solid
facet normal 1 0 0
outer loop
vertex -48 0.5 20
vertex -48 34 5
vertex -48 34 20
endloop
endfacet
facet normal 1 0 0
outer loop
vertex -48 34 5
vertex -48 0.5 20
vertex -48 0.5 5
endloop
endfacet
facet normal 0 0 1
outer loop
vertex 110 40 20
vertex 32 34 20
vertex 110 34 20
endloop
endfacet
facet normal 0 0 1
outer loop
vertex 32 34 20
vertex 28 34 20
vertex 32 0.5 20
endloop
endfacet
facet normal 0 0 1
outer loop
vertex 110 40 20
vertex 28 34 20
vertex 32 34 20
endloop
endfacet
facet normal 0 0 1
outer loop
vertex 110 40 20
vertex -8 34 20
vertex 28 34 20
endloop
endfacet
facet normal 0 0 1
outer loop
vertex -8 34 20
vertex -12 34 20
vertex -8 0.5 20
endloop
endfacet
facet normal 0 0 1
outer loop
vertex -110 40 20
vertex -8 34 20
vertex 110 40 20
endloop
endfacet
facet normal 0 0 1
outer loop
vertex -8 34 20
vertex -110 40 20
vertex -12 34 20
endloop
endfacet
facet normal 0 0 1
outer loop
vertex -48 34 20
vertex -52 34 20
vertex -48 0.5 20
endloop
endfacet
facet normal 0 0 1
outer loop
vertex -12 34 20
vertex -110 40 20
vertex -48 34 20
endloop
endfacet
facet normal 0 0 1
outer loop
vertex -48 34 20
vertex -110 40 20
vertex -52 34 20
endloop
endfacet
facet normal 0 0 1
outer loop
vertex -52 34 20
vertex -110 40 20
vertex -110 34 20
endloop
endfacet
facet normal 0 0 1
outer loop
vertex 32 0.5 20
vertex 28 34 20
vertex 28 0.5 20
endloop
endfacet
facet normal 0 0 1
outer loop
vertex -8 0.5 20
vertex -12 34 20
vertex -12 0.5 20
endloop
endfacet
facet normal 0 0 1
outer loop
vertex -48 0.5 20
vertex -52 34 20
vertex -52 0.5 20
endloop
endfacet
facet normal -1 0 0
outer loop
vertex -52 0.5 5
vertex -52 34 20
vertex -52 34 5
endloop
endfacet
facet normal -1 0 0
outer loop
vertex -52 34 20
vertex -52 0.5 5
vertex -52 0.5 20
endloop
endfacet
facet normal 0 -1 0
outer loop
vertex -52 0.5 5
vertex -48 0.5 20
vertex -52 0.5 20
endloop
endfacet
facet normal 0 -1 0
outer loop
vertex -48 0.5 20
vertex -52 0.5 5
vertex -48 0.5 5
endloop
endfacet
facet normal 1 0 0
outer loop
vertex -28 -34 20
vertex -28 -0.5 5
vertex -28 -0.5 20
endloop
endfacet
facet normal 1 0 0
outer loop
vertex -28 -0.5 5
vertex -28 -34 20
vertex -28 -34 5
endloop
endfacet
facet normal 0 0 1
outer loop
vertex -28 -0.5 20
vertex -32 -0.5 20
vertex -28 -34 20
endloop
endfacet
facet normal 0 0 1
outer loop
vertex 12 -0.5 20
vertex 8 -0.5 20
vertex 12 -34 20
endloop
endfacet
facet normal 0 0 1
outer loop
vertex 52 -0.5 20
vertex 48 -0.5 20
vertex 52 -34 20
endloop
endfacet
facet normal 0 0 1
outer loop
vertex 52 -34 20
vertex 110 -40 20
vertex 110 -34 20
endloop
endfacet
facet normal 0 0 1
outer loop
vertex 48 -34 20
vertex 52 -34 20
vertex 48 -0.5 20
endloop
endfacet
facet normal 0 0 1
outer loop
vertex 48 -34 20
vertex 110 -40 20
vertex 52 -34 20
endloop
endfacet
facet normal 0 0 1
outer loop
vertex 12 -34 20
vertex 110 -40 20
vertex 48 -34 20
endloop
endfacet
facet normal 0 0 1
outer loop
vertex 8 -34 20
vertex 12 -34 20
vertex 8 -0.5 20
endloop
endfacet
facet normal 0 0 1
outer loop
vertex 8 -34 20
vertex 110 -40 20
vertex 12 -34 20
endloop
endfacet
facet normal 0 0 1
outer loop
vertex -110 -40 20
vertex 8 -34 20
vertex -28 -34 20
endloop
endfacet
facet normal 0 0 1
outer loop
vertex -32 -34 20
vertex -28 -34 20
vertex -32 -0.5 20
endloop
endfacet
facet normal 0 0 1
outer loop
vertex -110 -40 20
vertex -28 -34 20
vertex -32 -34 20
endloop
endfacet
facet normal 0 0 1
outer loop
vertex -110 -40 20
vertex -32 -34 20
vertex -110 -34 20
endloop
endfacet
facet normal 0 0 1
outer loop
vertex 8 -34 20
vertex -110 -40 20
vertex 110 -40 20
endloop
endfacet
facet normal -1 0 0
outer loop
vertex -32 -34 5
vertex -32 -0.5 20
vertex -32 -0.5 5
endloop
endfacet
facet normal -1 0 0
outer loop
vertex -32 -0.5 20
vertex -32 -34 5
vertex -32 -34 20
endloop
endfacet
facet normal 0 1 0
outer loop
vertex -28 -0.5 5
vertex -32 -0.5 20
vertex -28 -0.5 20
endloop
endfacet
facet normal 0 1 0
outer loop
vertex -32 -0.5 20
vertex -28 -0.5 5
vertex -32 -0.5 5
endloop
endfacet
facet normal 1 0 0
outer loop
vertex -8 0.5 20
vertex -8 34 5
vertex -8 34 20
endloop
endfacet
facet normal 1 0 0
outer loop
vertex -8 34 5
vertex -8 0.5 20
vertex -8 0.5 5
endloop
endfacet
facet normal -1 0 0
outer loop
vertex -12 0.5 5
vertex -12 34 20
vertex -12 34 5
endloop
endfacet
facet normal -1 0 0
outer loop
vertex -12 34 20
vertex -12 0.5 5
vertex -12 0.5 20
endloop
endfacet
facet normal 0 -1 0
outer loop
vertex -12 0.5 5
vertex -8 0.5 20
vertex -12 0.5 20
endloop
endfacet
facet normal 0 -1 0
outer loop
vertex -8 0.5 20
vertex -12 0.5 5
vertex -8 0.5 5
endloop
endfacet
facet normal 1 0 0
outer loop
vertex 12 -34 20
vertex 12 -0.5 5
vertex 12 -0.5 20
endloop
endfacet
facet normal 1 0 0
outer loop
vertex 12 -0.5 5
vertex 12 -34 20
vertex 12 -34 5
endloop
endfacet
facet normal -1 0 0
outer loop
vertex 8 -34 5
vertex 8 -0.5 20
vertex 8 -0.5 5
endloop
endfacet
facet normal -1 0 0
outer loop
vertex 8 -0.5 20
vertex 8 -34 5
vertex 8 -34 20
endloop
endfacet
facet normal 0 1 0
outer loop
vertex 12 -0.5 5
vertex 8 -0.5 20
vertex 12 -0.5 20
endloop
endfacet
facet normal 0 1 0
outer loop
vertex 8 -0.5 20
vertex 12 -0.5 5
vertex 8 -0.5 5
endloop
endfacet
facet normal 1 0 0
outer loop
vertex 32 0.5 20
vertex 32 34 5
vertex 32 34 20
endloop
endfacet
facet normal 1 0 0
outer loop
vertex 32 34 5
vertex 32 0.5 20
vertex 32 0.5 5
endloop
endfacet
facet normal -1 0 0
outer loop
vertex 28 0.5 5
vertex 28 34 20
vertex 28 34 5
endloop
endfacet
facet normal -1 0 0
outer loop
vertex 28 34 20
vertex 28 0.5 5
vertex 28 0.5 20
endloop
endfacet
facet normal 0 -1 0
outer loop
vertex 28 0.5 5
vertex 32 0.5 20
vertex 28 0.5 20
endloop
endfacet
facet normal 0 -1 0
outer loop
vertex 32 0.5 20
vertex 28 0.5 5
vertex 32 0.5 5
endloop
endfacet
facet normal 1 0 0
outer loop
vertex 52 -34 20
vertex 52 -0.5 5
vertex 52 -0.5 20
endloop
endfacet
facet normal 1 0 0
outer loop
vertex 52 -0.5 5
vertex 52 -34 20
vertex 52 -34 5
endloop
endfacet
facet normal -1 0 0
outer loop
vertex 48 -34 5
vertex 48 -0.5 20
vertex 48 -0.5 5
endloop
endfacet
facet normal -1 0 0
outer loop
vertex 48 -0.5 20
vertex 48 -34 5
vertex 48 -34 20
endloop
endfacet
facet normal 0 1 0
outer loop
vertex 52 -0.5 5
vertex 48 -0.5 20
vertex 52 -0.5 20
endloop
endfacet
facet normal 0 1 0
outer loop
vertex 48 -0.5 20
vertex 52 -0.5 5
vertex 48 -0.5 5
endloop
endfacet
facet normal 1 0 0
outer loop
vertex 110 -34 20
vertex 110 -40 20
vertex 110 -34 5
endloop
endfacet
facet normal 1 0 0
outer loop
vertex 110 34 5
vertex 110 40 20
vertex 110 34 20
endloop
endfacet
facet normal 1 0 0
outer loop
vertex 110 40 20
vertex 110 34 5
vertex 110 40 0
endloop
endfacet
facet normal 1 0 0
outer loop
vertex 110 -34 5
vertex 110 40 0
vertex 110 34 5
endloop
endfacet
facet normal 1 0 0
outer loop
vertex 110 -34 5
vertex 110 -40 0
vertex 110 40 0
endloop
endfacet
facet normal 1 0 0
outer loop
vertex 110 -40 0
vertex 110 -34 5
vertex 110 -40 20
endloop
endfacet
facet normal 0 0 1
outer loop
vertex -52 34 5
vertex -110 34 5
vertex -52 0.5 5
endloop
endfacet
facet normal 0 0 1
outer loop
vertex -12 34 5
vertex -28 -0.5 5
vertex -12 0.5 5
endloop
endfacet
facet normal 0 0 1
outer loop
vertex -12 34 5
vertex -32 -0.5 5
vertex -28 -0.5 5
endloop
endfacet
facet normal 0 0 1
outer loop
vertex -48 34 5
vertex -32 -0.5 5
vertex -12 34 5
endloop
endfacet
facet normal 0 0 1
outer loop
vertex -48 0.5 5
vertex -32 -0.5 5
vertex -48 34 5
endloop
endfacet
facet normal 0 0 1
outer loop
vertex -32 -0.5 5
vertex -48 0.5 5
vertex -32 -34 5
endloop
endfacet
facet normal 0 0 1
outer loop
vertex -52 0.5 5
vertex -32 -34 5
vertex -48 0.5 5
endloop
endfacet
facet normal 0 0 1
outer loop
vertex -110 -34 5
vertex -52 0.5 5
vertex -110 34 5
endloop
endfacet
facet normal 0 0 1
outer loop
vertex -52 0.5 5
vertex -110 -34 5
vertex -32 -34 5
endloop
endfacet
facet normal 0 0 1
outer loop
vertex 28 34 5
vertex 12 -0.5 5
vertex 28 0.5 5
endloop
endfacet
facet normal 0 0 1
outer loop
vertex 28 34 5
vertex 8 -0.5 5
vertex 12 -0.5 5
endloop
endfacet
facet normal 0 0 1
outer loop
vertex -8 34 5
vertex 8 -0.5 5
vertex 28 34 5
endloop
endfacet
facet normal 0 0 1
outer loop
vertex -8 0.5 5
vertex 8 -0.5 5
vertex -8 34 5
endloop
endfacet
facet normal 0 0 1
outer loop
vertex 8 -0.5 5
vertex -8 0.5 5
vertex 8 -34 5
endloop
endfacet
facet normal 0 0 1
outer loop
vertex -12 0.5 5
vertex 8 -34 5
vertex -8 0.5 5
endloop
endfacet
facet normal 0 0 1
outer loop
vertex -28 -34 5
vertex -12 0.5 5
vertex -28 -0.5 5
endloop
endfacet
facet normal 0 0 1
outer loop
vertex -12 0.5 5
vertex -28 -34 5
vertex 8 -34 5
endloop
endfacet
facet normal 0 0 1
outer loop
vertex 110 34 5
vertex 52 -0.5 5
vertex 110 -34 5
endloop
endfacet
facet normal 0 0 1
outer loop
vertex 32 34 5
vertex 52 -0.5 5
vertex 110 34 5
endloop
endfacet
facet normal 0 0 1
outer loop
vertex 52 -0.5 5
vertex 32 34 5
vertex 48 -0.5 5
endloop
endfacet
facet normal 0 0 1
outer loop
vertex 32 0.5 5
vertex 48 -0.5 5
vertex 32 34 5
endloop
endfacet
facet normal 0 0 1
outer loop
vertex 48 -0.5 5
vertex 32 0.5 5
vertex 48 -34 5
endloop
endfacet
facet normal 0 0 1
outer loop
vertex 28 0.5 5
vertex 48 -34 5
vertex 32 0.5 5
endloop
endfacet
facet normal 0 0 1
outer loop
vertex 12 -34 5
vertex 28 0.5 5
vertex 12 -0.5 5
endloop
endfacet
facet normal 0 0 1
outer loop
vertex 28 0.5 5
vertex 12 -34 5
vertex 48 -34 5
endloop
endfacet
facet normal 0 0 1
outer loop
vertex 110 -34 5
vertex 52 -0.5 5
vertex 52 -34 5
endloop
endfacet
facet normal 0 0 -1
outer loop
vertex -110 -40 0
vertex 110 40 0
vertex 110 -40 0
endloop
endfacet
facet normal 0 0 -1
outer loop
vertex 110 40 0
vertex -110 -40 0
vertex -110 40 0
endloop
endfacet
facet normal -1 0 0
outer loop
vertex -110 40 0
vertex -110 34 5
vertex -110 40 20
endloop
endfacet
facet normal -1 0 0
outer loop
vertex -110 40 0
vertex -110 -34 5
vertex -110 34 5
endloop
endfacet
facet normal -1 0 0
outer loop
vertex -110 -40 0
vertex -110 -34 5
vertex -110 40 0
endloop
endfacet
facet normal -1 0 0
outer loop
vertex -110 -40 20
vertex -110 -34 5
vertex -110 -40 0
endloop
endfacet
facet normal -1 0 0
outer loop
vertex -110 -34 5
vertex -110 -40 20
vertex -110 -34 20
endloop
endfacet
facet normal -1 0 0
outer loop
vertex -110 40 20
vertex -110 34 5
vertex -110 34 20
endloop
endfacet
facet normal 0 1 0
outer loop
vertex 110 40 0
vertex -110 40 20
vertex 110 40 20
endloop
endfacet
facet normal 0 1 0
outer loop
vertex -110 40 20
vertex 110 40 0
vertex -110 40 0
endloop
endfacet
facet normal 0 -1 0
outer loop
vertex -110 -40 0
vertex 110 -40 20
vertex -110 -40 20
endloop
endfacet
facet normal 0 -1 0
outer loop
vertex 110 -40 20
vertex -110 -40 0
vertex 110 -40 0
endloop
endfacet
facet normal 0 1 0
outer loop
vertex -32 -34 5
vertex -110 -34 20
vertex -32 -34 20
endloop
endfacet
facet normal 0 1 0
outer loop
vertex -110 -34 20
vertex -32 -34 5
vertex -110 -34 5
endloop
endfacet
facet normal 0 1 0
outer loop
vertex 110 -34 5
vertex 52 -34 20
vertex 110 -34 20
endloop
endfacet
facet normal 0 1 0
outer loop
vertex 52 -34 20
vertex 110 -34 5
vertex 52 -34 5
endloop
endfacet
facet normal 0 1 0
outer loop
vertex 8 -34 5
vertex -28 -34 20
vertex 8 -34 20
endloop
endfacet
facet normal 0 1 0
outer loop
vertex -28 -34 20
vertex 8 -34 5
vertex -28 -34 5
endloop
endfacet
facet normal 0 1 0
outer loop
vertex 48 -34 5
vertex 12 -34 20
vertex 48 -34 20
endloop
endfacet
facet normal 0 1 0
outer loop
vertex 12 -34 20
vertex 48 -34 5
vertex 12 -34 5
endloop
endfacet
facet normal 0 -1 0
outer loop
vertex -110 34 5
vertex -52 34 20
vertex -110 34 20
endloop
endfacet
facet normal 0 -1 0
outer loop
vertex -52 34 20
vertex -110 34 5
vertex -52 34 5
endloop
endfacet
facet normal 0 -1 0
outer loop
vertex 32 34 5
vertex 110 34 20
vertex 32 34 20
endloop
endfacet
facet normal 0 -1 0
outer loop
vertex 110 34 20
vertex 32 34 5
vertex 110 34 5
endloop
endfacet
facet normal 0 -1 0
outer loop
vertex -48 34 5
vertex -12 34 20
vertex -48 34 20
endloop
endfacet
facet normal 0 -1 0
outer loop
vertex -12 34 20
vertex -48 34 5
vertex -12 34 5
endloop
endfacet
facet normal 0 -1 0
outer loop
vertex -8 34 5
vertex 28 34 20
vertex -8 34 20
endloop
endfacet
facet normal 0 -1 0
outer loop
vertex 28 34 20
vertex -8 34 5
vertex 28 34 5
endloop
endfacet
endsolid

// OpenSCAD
$fn = 32;

// ----------------------------------------------------------------------
// Rib frame 220 x 80 x 20
// 6 ribs at 20 mm pitch, staggered
// ----------------------------------------------------------------------

// --- parameters (mm) ---
frame = [220, 80, 5];  // base plate size (x, y, z)
rail_w = 6;            // side rail width
ribs = 6;              // number of ribs
rib_t = 4;             // rib thickness
rib_h = 15;            // rib height above the base plate
pitch = 20;            // pitch between rib centres

// --- derived feature positions (mm) ---
span = (ribs - 1) * pitch;          // = 100   distance between the outer ribs
origin_x = -span / 2;               // = -50   X of the first rib
rib_len = frame[1] / 2 - rail_w + 0.5;  // = 34.5   length of a staggered rib
rib_y = 0.5 + rib_len / 2;          // = 17.75   Y of a staggered rib centre
row_offset = 2 * rib_y;             // = 35.5   distance between the two rows
feature_centers = [
  [origin_x + 0 * pitch, rib_y],
  [origin_x + 1 * pitch, -rib_y],
  [origin_x + 2 * pitch, rib_y],
  [origin_x + 3 * pitch, -rib_y],
  [origin_x + 4 * pitch, rib_y],
  [origin_x + 5 * pitch, -rib_y]
];   // rib centre line, drives the rib loop

// base plate, two side rails, then the ribs read straight off feature_centers
union() {
  translate([-frame[0] / 2, -frame[1] / 2, 0]) cube(frame);
  translate([-frame[0] / 2, -frame[1] / 2, 0]) cube([frame[0], rail_w, frame[2] + rib_h]);
  translate([-frame[0] / 2, frame[1] / 2 - rail_w, 0]) cube([frame[0], rail_w, frame[2] + rib_h]);
  for (centre = feature_centers)
    translate([centre[0] - rib_t / 2, centre[1] - rib_len / 2, frame[2] - 1])
      cube([rib_t, rib_len, rib_h + 1]);
}
